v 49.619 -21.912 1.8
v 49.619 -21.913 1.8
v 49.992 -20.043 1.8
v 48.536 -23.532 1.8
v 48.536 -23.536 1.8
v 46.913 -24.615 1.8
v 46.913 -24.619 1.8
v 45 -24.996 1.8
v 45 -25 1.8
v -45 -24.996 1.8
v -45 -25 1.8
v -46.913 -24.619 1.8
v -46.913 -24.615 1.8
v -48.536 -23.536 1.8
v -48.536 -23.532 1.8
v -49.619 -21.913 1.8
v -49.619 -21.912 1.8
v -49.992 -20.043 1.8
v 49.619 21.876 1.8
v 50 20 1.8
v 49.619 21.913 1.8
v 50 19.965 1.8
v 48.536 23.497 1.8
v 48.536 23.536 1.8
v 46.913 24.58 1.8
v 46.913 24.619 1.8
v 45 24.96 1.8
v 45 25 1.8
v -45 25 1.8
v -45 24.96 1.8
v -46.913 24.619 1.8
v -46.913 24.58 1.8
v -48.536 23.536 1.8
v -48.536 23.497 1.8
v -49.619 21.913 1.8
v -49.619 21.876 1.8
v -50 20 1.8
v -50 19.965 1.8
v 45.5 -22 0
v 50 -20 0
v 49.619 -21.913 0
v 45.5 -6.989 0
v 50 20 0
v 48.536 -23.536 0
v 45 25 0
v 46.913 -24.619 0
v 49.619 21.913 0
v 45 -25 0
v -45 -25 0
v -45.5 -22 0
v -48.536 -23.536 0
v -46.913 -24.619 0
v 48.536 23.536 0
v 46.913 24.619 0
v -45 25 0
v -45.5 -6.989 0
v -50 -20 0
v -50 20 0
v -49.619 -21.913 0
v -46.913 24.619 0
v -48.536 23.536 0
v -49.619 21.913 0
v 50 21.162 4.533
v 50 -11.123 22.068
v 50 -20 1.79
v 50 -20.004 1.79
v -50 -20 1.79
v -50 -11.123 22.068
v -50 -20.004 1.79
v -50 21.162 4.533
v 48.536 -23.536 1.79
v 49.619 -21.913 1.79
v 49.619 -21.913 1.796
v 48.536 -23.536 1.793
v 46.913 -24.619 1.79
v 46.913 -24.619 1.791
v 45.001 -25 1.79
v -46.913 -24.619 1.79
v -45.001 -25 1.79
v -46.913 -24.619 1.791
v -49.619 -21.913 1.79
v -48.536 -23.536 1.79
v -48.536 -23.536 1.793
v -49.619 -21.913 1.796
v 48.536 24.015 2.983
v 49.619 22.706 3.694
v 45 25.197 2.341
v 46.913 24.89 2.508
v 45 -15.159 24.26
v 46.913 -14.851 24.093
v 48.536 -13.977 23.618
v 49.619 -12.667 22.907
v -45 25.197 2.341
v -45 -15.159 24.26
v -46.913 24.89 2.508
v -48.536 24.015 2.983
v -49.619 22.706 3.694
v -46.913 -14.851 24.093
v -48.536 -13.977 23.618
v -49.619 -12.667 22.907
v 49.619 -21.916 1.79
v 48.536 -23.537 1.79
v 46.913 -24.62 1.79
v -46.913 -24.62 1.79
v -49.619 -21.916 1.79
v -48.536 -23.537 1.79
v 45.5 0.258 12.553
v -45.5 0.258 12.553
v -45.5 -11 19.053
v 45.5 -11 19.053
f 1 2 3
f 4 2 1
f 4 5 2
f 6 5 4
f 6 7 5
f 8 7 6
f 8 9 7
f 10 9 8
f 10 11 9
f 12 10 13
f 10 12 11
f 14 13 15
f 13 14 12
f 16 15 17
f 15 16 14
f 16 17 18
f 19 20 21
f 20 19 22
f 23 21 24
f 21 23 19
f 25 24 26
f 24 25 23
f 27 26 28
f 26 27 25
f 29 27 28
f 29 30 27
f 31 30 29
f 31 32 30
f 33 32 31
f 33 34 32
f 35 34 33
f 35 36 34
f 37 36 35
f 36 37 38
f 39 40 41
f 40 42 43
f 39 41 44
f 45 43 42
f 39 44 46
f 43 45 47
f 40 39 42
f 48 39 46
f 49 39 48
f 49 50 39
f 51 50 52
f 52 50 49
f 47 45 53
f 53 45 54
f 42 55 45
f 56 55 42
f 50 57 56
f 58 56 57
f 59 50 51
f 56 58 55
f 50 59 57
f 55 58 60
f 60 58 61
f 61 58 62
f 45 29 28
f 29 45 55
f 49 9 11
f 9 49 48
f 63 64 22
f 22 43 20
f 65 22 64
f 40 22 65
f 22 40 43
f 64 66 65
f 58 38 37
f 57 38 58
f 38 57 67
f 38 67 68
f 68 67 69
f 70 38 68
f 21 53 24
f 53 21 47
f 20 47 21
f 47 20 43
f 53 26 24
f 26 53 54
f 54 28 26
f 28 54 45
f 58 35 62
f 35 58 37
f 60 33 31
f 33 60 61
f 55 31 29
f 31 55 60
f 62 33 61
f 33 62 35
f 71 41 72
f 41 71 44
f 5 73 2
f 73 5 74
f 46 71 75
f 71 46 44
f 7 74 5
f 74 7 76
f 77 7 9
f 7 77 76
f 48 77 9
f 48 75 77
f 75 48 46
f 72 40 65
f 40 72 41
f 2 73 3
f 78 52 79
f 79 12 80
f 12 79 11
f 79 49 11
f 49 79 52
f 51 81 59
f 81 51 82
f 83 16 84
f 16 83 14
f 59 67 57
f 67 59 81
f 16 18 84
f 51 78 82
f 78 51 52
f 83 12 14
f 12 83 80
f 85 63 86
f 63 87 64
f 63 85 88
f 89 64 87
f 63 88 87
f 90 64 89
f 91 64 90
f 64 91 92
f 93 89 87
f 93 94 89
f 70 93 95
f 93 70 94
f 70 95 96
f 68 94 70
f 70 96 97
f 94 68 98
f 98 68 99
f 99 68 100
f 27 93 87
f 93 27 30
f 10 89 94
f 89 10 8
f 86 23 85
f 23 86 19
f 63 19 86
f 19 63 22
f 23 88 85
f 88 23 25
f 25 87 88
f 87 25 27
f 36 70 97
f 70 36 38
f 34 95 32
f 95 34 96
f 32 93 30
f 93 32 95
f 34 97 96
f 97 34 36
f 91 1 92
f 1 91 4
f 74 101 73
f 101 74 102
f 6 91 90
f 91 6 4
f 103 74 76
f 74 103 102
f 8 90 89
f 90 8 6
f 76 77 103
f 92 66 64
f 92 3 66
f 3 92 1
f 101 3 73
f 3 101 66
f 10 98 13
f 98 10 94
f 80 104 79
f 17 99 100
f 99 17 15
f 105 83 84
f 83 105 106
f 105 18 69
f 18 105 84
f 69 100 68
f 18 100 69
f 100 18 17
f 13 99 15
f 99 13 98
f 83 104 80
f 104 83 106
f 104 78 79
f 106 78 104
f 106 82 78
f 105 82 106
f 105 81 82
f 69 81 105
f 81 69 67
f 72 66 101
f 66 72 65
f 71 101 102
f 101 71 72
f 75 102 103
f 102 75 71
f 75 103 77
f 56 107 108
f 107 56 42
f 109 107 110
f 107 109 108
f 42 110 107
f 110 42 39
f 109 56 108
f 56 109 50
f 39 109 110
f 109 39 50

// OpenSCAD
// preview[view:south, tilt:bottom]

/* [Color One] */

// Load a 150x40 pixel image. This is the artwork for the first colour in the logo. The background should be black and the logo white. If not, make sure to click the Invert Colors checkbox.
tone_one = "tone_one.dat"; // [image_surface:150x40]

// What Z height would you like to pause the printer to change the filament for the first logo color (mm)?
z_height_one = 0.6;

/* [Color Two] */

// Load a  150x40 pixel image. This is the artwork for the second colour in the logo. The background should be black and the logo white. If not, make sure to click the Invert Colors checkbox.
tone_two = "tone_two.dat"; // [image_surface:150x40]

// What Z height would you like to pause the printer to change the filament for the second logo color (mm)?
z_height_two = 1.2;

/* [Hidden] */

holder_x = 100;
holder_y = 50;
holder_z = 25;
card_x = 91;
card_y = 13;
card_z = 22;
corner_radius = 5;
box_x = holder_x - (corner_radius * 2);
box_y = holder_y - (corner_radius * 2);
face_z = z_height_one + z_height_two;
offset_x = (holder_x / 2) - corner_radius;
offset_y = (holder_y / 2) - corner_radius;
logo_x = 90;
logo_y = 24;
scale_x = 150;
scale_y = 40;

difference() {
	translate([0, 0, face_z]) {
		translate([0, 0, -(face_z/2)]) {
			cube([box_x, holder_y, face_z], center=true);
			cube([holder_x, box_y, face_z], center=true);
			translate([ offset_x,  offset_y, 0]) cylinder(h=face_z, r=corner_radius, center=true);
			translate([-offset_x,  offset_y, 0]) cylinder(h=face_z, r=corner_radius, center=true);
			translate([ offset_x, -offset_y, 0]) cylinder(h=face_z, r=corner_radius, center=true);
			translate([-offset_x, -offset_y, 0]) cylinder(h=face_z, r=corner_radius, center=true);
		}
		translate([0, -holder_y / 2, -0.01]) scale([1, 0.898, 1]) rotate([-26, 0, 0]) difference() {
			translate([0, holder_y / 2, holder_z/2]) {
				cube([box_x, holder_y, holder_z], center=true);
				cube([holder_x, box_y, holder_z], center=true);
				translate([ offset_x,  offset_y, 0]) cylinder(h=holder_z, r=corner_radius, center=true);
				translate([-offset_x,  offset_y, 0]) cylinder(h=holder_z, r=corner_radius, center=true);
				translate([ offset_x, -offset_y, 0]) cylinder(h=holder_z, r=corner_radius, center=true);
				translate([-offset_x, -offset_y, 0]) cylinder(h=holder_z, r=corner_radius, center=true);
			}
			rotate([26, 0, 0]) translate([0, holder_y / 2, -holder_z/2]) cube([holder_x + 1, holder_y * 4/3, holder_z], center=true);
		}
	}
	translate([0, -holder_y/2+3, 0]) rotate([-30, 0, 0]) translate([0, card_y/2, 0]) cube([card_x, card_y, card_z*2], center=true);
	translate([0, (logo_y/2)-3, -0.01]) mirror([1,0,0]) rotate([0, 0, 180]) {
		scale([(logo_x)/scale_x, (logo_y)/scale_y, z_height_one]) surface(file=tone_one, center=true, convexity=5);
		scale([(logo_x)/scale_x, (logo_y)/scale_y, z_height_two]) surface(file=tone_two, center=true, convexity=5);
	}
}
